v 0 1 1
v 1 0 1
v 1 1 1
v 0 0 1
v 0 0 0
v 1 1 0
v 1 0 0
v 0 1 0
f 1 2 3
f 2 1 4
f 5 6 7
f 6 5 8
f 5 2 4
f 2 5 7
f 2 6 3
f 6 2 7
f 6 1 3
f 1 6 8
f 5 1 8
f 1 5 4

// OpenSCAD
// SYMPTOM: resize() with a NEGATIVE newsize component scaled that axis by the
//   negative ratio, producing a mirrored/oversized solid. resize([-5,0,0])
//   cube([1,1,1]) imported as a volume-5 solid (X factor -5) instead of the unit
//   cube. A contributor (alongside the auto-on-explicit-axis UNKNOWN) to the
//   t3d__resize-tests residual.
// CAUSE: importCSG.p_resize_action guarded the "leave this axis unchanged" case
//   with an exact string compare `if new_size[r] == '0'`. A negative target
//   formats as e.g. '-5', never equals '0', so it fell through to
//   factor = float('-5')/old_size = -5 -> Matrix.scale(-5,1,1) -> mirrored cube.
// FIX: importCSG.py p_resize_action -> replace the `== '0'` guard with a numeric
//   `float(new_size[r]) <= 0` test, so 0, 0.0 and negatives all leave that axis
//   unchanged (factor 1.0). Commit <pending>.
// EXPECTED (OpenSCAD): a newsize <= 0 means "do not resize this axis" -- it is
//   NOT a mirror. resize([-5,0,0]) cube([1,1,1]) renders as the original unit
//   cube, volume 1 (verified by openscad STL render = 1.0).
resize([-5, 0, 0])
	cube([1, 1, 1]);
